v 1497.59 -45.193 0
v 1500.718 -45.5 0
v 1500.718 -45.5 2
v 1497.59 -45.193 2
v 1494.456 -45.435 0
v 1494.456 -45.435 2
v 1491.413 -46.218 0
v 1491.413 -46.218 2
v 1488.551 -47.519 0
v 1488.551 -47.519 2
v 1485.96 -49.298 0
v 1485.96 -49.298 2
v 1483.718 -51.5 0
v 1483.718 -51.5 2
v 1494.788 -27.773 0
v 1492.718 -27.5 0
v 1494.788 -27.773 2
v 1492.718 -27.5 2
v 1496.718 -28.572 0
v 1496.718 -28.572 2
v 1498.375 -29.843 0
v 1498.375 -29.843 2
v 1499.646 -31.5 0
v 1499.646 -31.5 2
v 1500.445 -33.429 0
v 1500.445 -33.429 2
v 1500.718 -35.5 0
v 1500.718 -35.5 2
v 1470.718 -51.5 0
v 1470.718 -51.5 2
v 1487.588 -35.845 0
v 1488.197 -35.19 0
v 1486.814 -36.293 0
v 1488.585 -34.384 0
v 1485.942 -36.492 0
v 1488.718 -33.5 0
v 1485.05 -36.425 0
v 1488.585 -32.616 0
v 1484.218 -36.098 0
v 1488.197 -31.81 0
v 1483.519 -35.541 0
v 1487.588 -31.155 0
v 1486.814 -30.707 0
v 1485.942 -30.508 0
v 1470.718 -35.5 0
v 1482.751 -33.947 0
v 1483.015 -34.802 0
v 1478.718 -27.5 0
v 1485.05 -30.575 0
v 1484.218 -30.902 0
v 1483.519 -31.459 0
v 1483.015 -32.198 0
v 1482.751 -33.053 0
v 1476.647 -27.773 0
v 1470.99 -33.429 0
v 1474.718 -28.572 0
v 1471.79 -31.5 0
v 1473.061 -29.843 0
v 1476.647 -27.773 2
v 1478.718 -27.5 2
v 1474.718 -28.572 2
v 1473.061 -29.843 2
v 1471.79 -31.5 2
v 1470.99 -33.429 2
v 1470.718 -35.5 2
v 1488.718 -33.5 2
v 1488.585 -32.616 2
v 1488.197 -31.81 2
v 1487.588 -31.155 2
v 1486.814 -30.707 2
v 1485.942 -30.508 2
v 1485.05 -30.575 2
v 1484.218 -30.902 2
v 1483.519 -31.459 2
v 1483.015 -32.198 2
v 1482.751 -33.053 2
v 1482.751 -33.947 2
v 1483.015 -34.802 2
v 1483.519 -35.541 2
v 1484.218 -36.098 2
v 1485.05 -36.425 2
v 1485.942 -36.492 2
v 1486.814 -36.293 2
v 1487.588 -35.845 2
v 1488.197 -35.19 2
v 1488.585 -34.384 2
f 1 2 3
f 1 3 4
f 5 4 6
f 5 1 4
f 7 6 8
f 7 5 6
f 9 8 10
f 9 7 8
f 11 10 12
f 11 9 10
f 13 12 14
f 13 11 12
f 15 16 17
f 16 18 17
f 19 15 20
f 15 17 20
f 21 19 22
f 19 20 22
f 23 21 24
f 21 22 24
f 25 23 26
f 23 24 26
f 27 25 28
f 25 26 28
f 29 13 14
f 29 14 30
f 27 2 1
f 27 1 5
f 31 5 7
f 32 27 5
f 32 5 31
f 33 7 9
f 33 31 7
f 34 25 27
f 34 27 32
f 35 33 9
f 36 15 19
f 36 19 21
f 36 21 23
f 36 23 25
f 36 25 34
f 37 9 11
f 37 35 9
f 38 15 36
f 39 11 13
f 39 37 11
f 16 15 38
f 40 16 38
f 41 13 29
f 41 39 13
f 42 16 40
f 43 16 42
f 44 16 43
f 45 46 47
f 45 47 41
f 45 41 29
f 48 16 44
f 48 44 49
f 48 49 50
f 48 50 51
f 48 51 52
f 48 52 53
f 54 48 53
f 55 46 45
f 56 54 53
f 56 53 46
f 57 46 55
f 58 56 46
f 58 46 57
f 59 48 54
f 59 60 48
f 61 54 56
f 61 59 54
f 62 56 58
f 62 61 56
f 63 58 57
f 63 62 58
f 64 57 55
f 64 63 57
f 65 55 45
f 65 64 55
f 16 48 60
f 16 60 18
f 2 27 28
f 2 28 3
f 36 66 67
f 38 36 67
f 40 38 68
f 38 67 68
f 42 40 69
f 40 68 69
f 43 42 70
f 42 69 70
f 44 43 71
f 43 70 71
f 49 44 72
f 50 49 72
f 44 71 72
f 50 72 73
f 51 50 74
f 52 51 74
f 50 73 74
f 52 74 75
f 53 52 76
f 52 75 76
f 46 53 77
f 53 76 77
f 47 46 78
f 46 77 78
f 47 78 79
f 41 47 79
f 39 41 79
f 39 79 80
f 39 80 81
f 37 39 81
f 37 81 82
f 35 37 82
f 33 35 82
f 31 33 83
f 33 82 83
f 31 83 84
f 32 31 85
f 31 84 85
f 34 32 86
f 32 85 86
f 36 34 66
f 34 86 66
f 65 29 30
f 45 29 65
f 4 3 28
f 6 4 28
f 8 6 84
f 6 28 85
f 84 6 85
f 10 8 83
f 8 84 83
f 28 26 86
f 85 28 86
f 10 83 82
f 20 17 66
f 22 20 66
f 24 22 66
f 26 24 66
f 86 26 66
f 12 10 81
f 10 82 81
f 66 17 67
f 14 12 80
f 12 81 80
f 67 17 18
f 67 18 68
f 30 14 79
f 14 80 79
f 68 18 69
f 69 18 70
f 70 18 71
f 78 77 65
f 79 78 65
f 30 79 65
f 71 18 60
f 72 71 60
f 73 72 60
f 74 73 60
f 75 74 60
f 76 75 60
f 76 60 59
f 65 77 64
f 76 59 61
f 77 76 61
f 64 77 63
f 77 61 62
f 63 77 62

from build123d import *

# Parameters (mm, degrees)
DODANIE_WYCI_GNI_CIE2_DEPTH = 2
SZKIC4_R                    = 3
WYTNIJ_WYCI_GNI_CIE2_DEPTH  = 2
ZAOKR_GLENIE1_R             = 8
ZAOKR_GLENIE2_R             = 8


with BuildPart() as part:
    # Szkic3 → Dodanie-wyciągnięcie2 (new body)
    with BuildSketch(Plane.XY):
        with BuildLine():
            Line((1470.717856821, -27.5), (1500.717856821, -27.5))
            Line((1500.717856821, -27.5), (1500.717856821, -45.5))
            ThreePointArc((1500.717856821, -45.5), (1491.412577396, -46.218374962), (1483.717856821, -51.5))
            Line((1483.717856821, -51.5), (1470.717856821, -51.5))
            Line((1470.717856821, -51.5), (1470.717856821, -27.5))
        make_face()
    extrude(amount=DODANIE_WYCI_GNI_CIE2_DEPTH)

    # Szkic4 → Wytnij-wyciągnięcie2 (cut)
    with BuildSketch(Plane.XY.offset(2)):
        with Locations((1485.717856821, -33.5)):
            Circle(SZKIC4_R)
    extrude(amount=-WYTNIJ_WYCI_GNI_CIE2_DEPTH, mode=Mode.SUBTRACT)

    # Zaokrąglenie1
    zaokr_glenie1_edges = [part.edges().sort_by_distance(p)[0] for p in [
        (1470.717856821, -27.5, 1),
    ]]
    fillet(zaokr_glenie1_edges, radius=ZAOKR_GLENIE1_R)

    # Zaokrąglenie2
    zaokr_glenie2_edges = [part.edges().sort_by_distance(p)[0] for p in [
        (1500.717856821, -27.5, 1),
    ]]
    fillet(zaokr_glenie2_edges, radius=ZAOKR_GLENIE2_R)


solid = part.part
